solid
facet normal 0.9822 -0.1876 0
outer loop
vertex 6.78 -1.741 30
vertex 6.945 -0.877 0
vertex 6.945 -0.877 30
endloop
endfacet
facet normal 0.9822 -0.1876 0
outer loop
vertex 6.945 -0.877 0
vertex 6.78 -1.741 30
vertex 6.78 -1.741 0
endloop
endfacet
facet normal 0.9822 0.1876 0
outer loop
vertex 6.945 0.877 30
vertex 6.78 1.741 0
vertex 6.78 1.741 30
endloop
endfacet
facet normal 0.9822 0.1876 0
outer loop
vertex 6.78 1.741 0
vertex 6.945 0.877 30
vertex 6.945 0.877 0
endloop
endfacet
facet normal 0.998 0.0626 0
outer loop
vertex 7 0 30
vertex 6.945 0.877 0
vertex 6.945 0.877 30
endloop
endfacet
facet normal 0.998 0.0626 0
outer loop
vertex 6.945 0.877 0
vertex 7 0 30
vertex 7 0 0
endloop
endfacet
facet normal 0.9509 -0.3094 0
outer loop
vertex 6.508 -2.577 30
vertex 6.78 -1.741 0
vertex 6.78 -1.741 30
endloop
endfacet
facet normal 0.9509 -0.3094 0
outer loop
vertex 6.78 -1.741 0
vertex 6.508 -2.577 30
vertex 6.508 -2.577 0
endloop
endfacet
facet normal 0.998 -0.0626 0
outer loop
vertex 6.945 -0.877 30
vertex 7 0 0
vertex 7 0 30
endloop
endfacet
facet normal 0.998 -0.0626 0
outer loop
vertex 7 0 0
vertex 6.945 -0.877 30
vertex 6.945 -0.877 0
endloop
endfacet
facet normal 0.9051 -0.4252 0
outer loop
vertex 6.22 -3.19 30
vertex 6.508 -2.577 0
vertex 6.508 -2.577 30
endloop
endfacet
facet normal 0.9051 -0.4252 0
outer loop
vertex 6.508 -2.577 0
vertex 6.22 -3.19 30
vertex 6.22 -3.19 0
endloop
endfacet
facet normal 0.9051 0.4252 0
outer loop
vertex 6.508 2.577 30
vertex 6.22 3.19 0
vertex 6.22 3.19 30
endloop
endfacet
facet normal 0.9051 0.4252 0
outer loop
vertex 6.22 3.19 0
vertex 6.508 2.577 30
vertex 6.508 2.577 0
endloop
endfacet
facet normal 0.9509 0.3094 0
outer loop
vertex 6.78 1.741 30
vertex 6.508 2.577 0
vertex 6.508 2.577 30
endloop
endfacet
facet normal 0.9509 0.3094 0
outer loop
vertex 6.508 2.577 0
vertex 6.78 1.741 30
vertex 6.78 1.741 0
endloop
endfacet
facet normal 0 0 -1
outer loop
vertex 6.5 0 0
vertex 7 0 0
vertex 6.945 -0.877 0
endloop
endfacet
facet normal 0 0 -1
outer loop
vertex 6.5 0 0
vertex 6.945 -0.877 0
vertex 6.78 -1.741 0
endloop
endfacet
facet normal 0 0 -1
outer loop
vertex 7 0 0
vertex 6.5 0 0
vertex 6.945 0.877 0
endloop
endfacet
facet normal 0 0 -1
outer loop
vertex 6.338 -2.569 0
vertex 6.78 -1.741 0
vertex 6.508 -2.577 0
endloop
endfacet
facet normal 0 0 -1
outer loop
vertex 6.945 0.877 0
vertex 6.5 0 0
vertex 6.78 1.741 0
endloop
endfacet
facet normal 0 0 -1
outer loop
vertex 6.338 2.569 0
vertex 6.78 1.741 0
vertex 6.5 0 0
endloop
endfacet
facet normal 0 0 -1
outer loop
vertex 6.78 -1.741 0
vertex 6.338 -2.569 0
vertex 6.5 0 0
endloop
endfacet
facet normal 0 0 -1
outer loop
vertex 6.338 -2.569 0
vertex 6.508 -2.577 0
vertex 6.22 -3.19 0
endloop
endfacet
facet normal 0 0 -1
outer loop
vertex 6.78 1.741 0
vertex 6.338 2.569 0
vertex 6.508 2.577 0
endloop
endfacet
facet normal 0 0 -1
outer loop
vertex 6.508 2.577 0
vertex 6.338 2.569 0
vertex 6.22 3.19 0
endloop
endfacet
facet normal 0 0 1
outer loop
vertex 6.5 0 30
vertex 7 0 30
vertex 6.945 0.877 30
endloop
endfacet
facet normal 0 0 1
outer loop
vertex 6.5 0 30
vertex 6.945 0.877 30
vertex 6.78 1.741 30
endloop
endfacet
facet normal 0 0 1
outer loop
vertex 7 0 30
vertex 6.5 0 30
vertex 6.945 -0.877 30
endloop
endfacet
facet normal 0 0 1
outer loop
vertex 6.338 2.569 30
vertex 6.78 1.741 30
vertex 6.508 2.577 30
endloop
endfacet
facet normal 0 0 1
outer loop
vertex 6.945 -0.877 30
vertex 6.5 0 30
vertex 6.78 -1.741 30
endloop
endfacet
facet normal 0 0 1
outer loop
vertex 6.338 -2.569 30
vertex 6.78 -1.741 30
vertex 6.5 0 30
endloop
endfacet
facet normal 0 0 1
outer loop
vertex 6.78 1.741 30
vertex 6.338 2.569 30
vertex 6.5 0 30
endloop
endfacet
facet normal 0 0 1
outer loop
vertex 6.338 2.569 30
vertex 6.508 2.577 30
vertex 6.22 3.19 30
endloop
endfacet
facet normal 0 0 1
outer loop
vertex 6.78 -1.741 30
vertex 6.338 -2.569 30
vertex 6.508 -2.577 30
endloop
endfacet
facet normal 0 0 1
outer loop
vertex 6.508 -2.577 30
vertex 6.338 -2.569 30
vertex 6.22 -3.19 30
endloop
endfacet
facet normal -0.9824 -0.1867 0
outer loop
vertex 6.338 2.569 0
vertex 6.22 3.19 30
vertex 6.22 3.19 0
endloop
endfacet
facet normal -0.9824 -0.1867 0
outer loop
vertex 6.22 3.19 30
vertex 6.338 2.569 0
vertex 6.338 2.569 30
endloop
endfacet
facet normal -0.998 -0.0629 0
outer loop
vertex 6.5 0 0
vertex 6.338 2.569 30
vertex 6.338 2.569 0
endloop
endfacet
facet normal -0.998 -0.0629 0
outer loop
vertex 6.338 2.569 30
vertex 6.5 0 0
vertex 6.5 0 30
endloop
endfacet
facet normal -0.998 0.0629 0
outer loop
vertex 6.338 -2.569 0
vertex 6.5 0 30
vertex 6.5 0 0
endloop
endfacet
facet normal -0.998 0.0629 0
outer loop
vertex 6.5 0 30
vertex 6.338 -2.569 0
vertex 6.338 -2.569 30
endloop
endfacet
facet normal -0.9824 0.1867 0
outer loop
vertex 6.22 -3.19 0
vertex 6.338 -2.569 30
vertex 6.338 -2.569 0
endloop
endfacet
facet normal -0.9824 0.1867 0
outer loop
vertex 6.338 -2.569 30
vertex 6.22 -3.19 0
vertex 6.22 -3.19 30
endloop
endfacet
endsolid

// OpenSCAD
$fn = 50;


difference() {
	union() {
		cylinder(h = 30, r = 7.0000000000);
		translate(v = [-17.0000000000, 0, 0]) {
			cylinder(h = 30, r = 7.0000000000);
		}
	}
	union() {
		cylinder(h = 30, r = 3.2500000000);
		cylinder(h = 30, r = 1.8000000000);
		cylinder(h = 30, r = 1.8000000000);
		cylinder(h = 30, r = 1.8000000000);
		translate(v = [-21.5000000000, 0, 0]) {
			hull() {
				translate(v = [-3.7500000000, 0.0000000000, 0]) {
					cylinder(h = 30, r = 10.5000000000);
				}
				translate(v = [3.7500000000, 0.0000000000, 0]) {
					cylinder(h = 30, r = 10.5000000000);
				}
				translate(v = [-3.7500000000, -0.0000000000, 0]) {
					cylinder(h = 30, r = 10.5000000000);
				}
				translate(v = [3.7500000000, -0.0000000000, 0]) {
					cylinder(h = 30, r = 10.5000000000);
				}
			}
		}
		translate(v = [-14.0000000000, 0, 0.0000000000]) {
			cylinder(h = 30, r = 20.5000000000);
		}
	}
}
